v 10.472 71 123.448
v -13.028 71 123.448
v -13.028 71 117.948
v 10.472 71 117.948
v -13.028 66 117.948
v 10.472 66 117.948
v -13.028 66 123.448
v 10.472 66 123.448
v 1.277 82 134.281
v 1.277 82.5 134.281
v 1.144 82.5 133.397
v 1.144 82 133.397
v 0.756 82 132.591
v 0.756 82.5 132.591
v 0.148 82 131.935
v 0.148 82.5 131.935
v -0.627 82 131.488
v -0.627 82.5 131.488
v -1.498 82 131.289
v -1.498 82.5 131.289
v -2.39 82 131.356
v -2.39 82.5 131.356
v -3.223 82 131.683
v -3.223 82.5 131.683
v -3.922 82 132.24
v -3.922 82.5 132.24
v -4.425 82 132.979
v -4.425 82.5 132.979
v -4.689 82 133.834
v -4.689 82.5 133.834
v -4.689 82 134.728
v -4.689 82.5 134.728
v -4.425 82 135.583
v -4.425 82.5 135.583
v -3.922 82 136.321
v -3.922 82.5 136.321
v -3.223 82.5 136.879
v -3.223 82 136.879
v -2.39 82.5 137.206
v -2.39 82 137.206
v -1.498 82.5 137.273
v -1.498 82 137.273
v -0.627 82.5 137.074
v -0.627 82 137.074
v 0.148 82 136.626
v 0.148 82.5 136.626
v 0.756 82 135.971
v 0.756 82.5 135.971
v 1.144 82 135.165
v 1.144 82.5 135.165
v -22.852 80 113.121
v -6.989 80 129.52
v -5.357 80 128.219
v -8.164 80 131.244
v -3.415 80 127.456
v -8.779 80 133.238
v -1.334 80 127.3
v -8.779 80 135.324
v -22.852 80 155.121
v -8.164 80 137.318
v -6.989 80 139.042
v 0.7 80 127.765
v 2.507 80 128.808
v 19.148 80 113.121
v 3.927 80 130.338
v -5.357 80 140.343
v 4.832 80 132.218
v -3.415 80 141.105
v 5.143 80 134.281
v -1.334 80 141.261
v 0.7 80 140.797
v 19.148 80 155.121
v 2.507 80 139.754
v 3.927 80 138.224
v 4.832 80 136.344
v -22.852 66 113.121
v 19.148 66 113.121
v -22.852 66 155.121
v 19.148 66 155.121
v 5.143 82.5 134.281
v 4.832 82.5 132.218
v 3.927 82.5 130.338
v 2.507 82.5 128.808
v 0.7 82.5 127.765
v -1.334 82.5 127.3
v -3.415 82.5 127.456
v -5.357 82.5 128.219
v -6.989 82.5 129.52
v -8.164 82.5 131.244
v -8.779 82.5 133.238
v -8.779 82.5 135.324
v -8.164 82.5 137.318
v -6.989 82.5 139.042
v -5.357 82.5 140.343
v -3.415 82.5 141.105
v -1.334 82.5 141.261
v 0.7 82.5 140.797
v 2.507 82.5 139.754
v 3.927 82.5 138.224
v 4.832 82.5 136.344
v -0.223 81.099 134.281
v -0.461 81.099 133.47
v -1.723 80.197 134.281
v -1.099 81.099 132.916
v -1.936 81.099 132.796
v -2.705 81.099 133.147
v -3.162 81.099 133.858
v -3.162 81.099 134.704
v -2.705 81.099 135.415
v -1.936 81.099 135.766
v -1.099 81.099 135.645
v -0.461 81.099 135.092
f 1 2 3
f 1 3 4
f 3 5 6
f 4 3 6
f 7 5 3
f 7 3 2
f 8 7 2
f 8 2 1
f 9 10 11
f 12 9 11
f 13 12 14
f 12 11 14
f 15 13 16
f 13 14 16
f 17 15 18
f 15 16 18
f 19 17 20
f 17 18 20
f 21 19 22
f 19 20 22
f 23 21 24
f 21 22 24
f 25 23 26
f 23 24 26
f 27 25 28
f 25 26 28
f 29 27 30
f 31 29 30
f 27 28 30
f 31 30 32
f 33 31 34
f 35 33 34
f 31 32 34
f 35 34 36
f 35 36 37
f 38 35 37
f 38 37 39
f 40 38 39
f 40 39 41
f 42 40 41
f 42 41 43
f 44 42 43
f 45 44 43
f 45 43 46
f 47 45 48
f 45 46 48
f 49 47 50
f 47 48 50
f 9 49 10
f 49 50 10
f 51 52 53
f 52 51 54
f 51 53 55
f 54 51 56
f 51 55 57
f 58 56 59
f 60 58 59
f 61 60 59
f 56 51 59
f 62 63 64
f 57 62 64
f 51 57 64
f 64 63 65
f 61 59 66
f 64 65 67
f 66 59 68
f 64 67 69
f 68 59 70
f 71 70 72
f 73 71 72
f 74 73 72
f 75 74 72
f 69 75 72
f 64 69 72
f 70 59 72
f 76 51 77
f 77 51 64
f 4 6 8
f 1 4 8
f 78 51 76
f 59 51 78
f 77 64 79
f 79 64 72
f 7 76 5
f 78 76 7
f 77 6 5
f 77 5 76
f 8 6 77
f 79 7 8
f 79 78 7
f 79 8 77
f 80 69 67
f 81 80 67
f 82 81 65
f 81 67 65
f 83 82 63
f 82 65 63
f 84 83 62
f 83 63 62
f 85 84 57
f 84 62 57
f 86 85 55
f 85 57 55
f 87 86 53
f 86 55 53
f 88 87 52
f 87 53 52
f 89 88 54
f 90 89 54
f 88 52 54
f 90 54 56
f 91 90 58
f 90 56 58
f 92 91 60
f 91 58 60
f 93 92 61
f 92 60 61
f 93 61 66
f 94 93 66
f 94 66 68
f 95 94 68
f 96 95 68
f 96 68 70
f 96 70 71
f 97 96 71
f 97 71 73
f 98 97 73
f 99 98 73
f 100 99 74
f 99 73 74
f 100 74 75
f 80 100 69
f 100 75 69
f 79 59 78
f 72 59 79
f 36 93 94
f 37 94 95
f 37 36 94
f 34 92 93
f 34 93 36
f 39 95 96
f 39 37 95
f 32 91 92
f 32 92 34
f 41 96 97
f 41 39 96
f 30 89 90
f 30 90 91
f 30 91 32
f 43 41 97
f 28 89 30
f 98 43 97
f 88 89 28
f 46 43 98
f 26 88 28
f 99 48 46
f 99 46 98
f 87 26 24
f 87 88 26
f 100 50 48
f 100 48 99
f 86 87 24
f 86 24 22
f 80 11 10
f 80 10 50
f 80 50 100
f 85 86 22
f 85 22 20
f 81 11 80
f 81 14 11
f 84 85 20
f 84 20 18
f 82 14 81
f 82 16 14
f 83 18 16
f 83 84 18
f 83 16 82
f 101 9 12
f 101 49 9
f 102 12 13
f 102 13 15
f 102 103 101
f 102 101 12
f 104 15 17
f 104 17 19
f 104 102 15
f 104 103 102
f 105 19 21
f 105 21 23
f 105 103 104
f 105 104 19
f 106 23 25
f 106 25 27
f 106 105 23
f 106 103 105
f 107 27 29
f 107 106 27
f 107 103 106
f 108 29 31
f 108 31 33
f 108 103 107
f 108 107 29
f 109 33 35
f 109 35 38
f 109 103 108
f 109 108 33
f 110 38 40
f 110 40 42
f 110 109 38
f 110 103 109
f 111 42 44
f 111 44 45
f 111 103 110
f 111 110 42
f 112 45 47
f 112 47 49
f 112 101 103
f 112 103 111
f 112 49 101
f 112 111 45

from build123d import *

# Parameters (mm, degrees)
SKETCH046_W     = 42
SKETCH046_H     = 42
PAD022_DEPTH    = 14
SKETCH047_R     = 7
PAD023_DEPTH    = 2.5
SKETCH048_R     = 3
HOLE_DEPTH      = 0.5
HOLE_TIPS_R     = 3
SKETCH049_W     = 23.5
SKETCH049_H     = 5.5
POCKET008_DEPTH = 5


with BuildPart() as part:
    # Sketch046 → Pad022 (new body)
    with BuildSketch(Plane.XZ):
        with Locations((8.147526, -9.378734)):
            Rectangle(SKETCH046_W, SKETCH046_H)
    extrude(amount=PAD022_DEPTH)

    # Sketch047 (on Face5 of Pad022) → Pad023 (join)
    with BuildSketch(Plane(origin=(0, 0, 0), x_dir=(1, 0, 0), z_dir=(0, 1, 0))):
        with Locations((8.142856, 9.219142)):
            Circle(SKETCH047_R)
    extrude(amount=PAD023_DEPTH)

    # Sketch048 (on Face8 of Pad023) → Hole (cut)
    with BuildSketch(Plane(origin=(0, 2.5, 0), x_dir=(1, 0, 0), z_dir=(0, 1, 0))):
        with Locations((8.27745, 9.219093)):
            Circle(SKETCH048_R)
    extrude(amount=-HOLE_DEPTH, mode=Mode.SUBTRACT)

    # Hole tips → Hole tip 1 section 0
    with BuildSketch(Plane(origin=(0, 2, 0), x_dir=(1, 0, 0), z_dir=(0, 1, 0)), mode=Mode.PRIVATE) as hole_tip_1_s0:
        with Locations((8.27745, 9.219093)):
            Circle(HOLE_TIPS_R)
    loft([hole_tip_1_s0.sketch, Vertex(8.27745, 0.197418, -9.219093)], mode=Mode.SUBTRACT)

    # Sketch049 (on Face5 of Hole) → Pocket008 (cut)
    with BuildSketch(Plane.XZ.offset(14)):
        with Locations((8.721823, -22.801634)):
            Rectangle(SKETCH049_W, SKETCH049_H)
    extrude(amount=-POCKET008_DEPTH, mode=Mode.SUBTRACT)


with BuildPart() as part_1:
    # Body007 placement: moved
    add(part.part.moved(Location((-10, 80, 143.5))))


solid = part_1.part
